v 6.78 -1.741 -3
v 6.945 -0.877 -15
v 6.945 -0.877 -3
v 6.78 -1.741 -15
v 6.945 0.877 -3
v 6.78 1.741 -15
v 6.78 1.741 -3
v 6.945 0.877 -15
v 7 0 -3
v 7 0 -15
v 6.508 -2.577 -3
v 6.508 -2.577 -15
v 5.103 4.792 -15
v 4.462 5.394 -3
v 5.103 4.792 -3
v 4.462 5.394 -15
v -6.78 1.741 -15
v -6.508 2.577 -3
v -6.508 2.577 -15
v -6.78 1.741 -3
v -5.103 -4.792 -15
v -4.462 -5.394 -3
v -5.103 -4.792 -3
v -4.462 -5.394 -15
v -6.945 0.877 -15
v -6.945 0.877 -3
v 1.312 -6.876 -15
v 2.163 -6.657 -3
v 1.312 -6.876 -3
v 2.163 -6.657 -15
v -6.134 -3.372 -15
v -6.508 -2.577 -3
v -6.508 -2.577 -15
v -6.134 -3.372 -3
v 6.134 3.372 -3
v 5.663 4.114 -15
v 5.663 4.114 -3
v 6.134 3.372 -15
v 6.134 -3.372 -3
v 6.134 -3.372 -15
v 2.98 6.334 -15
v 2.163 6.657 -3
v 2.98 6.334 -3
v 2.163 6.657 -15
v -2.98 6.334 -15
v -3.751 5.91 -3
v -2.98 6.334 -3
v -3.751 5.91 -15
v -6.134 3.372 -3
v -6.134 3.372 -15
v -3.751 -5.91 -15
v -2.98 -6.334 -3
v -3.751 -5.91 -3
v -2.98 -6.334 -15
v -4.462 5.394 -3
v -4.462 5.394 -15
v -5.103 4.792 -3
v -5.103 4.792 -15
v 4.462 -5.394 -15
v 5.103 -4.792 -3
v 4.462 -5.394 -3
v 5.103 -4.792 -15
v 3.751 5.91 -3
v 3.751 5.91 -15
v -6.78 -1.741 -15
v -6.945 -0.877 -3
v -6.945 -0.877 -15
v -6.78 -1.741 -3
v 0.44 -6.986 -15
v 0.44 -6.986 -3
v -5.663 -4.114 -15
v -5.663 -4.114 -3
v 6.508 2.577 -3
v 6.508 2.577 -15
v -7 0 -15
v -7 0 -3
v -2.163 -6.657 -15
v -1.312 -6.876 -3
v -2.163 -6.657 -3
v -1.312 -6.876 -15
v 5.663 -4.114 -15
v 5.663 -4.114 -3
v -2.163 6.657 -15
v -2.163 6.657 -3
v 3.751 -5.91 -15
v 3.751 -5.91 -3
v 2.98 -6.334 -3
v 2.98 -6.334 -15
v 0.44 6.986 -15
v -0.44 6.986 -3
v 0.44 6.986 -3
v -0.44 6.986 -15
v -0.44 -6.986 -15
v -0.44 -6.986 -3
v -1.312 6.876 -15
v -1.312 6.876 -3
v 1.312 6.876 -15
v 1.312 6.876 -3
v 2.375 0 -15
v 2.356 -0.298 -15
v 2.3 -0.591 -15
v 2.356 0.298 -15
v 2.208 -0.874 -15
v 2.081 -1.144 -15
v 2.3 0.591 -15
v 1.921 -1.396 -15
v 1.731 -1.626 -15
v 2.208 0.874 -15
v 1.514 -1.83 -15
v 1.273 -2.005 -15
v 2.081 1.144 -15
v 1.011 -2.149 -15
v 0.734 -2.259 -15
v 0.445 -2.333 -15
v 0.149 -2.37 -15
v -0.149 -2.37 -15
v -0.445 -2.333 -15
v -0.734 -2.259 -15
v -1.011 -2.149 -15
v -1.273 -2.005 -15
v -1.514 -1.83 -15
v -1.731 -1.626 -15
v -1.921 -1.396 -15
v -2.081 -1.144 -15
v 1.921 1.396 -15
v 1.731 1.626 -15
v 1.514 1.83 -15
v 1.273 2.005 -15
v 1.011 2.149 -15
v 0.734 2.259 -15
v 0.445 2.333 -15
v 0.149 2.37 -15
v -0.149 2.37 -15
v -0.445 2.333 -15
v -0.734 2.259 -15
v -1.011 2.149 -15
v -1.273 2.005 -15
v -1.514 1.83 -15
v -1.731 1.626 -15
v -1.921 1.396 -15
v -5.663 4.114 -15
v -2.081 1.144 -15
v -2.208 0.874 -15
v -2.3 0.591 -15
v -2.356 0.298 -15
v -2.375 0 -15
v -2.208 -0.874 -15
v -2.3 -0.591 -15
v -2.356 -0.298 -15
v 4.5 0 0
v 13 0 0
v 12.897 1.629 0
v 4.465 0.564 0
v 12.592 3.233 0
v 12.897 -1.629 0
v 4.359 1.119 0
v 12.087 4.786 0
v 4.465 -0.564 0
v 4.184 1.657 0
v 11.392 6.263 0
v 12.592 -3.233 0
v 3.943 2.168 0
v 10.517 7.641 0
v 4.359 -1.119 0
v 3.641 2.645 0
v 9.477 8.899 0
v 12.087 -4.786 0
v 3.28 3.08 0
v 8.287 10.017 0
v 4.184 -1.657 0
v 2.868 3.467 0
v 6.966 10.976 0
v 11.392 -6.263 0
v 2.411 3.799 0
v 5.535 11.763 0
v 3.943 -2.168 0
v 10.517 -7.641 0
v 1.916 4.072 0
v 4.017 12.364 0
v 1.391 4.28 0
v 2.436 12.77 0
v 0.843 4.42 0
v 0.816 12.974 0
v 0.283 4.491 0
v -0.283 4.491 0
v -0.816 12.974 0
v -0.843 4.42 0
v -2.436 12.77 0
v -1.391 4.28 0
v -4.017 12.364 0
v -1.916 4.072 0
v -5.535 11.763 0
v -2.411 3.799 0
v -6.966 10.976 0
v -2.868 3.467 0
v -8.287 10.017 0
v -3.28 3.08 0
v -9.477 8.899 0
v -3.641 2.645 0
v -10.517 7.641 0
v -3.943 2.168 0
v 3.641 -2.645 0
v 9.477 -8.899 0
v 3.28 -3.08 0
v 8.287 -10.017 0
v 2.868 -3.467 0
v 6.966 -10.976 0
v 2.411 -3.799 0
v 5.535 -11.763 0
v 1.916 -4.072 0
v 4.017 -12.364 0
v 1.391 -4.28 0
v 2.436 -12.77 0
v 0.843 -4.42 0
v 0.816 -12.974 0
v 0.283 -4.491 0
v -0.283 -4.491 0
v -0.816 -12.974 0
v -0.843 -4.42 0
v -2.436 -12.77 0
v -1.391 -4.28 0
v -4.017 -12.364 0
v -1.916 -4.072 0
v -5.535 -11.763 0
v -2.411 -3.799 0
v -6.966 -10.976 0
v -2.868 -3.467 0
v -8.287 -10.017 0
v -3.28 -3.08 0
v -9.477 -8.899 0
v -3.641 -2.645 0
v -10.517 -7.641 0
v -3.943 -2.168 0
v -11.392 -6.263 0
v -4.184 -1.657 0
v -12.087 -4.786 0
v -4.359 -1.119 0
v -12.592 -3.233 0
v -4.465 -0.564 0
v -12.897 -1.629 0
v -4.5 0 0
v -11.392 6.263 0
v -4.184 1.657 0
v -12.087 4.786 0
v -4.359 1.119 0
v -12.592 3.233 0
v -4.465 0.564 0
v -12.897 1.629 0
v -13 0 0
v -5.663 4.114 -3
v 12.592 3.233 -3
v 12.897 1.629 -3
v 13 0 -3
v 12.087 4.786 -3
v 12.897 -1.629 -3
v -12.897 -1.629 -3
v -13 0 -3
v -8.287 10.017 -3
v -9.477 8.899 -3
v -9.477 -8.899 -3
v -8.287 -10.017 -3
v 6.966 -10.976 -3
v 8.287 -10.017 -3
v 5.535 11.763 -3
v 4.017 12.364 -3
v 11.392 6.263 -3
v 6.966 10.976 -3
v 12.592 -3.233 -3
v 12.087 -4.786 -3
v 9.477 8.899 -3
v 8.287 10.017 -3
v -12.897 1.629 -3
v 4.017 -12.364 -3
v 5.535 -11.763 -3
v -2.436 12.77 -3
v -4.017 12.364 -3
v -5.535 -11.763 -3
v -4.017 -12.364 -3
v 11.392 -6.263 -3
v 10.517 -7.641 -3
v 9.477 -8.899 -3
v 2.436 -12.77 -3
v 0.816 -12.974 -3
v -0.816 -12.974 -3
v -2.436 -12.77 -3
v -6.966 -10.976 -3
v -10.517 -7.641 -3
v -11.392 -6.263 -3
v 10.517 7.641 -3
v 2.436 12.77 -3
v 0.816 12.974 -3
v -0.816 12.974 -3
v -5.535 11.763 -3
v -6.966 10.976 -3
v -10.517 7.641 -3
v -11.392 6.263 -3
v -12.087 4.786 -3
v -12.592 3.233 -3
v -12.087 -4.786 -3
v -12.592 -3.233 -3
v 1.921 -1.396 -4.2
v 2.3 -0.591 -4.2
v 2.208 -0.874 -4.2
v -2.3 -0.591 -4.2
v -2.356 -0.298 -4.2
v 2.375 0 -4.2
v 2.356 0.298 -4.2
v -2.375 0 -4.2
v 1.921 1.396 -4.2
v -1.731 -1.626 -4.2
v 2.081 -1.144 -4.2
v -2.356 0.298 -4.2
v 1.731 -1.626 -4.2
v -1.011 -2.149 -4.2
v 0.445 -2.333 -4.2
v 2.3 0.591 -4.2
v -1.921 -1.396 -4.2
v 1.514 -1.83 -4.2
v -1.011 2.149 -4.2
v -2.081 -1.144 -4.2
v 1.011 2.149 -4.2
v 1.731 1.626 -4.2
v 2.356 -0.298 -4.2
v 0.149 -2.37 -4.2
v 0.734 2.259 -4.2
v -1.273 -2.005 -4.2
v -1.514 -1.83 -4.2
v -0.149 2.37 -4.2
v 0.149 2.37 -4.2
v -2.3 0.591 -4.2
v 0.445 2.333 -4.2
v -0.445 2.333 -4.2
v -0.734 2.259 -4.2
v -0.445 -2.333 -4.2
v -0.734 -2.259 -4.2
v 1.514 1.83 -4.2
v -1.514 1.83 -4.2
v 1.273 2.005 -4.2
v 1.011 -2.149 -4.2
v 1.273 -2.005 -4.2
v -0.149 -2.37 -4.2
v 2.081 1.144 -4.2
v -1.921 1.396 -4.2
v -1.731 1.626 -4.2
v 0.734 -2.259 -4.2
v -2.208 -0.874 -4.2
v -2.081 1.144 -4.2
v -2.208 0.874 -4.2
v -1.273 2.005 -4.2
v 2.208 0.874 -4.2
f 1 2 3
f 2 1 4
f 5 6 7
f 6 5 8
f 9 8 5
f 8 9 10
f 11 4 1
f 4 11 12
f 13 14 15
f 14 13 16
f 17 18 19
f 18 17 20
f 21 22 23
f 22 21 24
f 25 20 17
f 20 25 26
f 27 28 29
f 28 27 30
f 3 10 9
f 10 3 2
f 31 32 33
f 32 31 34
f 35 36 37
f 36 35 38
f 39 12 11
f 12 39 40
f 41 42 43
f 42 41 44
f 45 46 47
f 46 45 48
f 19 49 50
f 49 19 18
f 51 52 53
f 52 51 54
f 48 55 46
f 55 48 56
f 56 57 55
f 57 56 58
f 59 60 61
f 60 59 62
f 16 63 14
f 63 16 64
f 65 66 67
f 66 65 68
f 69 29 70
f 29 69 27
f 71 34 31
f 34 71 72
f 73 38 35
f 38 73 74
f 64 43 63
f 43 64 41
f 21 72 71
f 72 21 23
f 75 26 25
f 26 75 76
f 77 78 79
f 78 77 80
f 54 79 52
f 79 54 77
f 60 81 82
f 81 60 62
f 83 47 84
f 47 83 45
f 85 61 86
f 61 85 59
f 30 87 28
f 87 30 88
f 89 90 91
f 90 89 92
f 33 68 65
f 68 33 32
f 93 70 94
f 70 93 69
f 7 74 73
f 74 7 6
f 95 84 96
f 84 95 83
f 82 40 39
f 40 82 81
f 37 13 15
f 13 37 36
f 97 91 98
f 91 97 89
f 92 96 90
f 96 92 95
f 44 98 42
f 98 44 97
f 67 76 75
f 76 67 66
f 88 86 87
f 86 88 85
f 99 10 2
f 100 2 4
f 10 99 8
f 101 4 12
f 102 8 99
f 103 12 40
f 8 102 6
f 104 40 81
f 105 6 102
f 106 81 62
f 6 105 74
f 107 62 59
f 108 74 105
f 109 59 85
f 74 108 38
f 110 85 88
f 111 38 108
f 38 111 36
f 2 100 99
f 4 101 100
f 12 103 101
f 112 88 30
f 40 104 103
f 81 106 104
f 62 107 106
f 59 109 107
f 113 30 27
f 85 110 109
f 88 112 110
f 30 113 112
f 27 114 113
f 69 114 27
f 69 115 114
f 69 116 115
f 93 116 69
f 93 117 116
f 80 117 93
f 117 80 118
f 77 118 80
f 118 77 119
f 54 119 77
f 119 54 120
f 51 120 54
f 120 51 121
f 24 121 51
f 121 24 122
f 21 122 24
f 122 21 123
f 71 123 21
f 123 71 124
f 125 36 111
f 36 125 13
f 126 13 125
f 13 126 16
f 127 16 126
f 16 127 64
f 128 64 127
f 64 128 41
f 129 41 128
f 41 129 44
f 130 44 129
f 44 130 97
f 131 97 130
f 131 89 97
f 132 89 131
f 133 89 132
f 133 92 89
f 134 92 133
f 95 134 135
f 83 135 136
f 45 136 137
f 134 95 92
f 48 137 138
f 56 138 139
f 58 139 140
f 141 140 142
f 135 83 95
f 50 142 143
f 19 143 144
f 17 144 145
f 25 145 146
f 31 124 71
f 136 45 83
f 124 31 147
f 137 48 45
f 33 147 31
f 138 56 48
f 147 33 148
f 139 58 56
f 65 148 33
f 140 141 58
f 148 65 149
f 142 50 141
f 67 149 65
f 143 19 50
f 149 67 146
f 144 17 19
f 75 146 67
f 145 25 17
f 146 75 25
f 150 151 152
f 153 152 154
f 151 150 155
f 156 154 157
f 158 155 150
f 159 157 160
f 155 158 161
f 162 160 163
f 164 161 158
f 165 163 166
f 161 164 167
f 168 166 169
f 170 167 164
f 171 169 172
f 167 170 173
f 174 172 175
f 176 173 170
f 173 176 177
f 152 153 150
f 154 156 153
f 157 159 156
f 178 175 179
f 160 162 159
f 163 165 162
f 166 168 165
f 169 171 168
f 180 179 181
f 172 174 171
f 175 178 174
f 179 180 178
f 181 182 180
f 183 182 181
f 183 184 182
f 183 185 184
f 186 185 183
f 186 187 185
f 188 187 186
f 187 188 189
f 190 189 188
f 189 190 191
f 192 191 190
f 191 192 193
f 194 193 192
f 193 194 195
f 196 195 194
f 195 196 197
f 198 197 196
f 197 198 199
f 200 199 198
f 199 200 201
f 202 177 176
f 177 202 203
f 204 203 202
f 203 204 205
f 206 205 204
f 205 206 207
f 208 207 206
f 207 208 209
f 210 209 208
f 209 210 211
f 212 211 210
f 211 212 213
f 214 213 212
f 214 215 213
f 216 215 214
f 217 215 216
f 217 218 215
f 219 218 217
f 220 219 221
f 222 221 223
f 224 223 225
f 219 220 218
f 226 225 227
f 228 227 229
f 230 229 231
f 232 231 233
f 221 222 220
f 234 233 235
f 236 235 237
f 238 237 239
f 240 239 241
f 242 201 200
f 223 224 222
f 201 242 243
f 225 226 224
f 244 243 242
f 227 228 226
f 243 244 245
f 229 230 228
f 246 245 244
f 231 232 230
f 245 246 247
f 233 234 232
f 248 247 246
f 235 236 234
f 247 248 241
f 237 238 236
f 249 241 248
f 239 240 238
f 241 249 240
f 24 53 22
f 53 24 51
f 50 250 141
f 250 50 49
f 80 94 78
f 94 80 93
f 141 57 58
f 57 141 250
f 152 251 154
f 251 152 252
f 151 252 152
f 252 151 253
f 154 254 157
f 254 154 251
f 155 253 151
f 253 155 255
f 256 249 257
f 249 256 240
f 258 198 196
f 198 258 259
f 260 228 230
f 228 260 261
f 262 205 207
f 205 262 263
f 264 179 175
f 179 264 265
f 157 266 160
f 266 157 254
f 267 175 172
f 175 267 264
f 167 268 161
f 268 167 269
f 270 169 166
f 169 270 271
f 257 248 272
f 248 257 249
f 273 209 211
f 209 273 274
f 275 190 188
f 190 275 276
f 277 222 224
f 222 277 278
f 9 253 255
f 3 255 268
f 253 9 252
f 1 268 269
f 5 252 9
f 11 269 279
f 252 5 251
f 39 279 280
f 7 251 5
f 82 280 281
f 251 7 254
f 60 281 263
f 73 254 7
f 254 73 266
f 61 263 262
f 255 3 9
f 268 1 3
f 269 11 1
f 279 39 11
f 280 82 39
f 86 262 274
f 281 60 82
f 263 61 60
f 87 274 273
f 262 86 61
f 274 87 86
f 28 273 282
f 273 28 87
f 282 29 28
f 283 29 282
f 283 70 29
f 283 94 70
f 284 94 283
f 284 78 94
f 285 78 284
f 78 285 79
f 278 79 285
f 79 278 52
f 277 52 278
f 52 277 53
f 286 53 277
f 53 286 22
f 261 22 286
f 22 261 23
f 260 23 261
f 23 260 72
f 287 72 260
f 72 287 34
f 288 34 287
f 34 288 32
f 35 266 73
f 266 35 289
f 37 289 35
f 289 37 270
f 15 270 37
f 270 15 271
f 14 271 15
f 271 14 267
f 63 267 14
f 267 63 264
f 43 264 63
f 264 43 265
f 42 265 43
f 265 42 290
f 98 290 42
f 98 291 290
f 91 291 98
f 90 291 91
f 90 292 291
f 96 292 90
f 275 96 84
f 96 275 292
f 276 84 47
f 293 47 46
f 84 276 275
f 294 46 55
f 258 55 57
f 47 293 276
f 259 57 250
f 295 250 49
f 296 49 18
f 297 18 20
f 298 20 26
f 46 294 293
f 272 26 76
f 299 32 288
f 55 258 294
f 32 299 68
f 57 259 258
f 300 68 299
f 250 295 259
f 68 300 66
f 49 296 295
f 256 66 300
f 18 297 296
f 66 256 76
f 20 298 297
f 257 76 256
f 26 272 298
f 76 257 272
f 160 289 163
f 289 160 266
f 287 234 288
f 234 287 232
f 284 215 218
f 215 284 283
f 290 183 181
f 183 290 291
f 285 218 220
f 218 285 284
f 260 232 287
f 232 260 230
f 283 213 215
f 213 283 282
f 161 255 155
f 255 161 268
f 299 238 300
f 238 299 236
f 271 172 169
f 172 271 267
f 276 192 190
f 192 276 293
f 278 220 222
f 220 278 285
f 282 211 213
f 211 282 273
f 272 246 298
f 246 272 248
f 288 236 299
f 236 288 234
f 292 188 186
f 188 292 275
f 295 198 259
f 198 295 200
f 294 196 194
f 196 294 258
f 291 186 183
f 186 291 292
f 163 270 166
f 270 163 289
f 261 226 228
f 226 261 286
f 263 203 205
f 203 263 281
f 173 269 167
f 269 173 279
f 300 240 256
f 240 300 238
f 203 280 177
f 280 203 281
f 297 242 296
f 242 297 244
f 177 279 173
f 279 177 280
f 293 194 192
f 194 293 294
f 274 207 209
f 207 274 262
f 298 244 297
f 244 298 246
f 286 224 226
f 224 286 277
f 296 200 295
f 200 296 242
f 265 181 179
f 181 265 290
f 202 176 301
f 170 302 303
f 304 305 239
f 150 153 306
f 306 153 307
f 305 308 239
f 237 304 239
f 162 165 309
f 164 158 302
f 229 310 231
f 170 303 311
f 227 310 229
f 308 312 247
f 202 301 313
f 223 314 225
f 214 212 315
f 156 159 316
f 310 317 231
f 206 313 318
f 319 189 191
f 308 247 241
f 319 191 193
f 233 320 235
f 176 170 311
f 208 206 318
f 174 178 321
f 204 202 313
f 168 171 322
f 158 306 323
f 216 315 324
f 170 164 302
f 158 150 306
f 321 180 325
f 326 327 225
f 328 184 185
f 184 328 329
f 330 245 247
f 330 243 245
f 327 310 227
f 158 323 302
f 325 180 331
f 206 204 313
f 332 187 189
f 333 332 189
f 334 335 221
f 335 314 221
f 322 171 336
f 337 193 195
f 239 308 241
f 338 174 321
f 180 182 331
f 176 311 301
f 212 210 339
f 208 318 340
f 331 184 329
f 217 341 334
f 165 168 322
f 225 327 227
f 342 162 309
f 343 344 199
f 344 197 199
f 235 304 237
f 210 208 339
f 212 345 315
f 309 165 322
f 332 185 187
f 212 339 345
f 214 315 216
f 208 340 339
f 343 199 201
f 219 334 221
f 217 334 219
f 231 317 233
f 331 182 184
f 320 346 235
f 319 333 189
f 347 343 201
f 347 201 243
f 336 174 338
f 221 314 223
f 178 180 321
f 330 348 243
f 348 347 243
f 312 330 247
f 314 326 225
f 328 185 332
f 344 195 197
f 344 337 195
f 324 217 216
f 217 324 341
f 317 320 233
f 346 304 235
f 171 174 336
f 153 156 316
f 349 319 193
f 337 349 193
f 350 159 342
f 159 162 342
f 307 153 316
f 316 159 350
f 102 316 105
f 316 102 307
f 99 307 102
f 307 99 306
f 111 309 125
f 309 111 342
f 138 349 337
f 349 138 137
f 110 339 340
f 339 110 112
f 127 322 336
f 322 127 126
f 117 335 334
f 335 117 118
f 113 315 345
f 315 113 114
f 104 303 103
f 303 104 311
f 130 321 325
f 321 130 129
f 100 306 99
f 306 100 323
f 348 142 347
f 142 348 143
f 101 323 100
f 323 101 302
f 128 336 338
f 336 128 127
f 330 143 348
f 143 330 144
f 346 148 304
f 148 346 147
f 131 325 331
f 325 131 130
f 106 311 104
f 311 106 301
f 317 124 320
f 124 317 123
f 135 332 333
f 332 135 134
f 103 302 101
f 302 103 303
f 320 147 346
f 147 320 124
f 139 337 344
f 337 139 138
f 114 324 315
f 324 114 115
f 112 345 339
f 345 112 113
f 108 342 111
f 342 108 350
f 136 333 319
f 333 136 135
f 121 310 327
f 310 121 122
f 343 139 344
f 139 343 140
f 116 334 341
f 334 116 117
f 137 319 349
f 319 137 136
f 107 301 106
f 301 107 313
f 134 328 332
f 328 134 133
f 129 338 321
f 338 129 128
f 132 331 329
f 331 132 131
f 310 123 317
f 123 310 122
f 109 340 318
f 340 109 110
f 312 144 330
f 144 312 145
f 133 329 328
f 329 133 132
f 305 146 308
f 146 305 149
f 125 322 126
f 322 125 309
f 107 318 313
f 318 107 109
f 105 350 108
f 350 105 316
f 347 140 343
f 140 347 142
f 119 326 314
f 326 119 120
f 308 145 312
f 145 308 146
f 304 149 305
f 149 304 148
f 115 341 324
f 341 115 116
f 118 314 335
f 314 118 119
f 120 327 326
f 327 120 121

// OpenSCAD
$fn = 50;


difference() {
	union() {
		translate(v = [0, 0, -15.0000000000]) {
			cylinder(h = 15, r = 7.0000000000);
		}
		translate(v = [0, 0, -3.0000000000]) {
			cylinder(h = 3, r = 13.0000000000);
		}
	}
	union() {
		translate(v = [0, 0, 0]) {
			rotate(a = [0, 0, 0]) {
				difference() {
					union() {
						#translate(v = [0, 0, -15.0000000000]) {
							cylinder(h = 15, r = 2.2500000000);
						}
						#translate(v = [0, 0, -4.2000000000]) {
							cylinder(h = 4.2000000000, r = 7.0000000000, r1 = 2.3750000000, r2 = 4.5000000000);
						}
						#translate(v = [0, 0, -15.0000000000]) {
							cylinder(h = 15, r = 2.3750000000);
						}
						#translate(v = [0, 0, -15.0000000000]) {
							cylinder(h = 15, r = 2.2500000000);
						}
					}
					union();
				}
			}
		}
	}
}
